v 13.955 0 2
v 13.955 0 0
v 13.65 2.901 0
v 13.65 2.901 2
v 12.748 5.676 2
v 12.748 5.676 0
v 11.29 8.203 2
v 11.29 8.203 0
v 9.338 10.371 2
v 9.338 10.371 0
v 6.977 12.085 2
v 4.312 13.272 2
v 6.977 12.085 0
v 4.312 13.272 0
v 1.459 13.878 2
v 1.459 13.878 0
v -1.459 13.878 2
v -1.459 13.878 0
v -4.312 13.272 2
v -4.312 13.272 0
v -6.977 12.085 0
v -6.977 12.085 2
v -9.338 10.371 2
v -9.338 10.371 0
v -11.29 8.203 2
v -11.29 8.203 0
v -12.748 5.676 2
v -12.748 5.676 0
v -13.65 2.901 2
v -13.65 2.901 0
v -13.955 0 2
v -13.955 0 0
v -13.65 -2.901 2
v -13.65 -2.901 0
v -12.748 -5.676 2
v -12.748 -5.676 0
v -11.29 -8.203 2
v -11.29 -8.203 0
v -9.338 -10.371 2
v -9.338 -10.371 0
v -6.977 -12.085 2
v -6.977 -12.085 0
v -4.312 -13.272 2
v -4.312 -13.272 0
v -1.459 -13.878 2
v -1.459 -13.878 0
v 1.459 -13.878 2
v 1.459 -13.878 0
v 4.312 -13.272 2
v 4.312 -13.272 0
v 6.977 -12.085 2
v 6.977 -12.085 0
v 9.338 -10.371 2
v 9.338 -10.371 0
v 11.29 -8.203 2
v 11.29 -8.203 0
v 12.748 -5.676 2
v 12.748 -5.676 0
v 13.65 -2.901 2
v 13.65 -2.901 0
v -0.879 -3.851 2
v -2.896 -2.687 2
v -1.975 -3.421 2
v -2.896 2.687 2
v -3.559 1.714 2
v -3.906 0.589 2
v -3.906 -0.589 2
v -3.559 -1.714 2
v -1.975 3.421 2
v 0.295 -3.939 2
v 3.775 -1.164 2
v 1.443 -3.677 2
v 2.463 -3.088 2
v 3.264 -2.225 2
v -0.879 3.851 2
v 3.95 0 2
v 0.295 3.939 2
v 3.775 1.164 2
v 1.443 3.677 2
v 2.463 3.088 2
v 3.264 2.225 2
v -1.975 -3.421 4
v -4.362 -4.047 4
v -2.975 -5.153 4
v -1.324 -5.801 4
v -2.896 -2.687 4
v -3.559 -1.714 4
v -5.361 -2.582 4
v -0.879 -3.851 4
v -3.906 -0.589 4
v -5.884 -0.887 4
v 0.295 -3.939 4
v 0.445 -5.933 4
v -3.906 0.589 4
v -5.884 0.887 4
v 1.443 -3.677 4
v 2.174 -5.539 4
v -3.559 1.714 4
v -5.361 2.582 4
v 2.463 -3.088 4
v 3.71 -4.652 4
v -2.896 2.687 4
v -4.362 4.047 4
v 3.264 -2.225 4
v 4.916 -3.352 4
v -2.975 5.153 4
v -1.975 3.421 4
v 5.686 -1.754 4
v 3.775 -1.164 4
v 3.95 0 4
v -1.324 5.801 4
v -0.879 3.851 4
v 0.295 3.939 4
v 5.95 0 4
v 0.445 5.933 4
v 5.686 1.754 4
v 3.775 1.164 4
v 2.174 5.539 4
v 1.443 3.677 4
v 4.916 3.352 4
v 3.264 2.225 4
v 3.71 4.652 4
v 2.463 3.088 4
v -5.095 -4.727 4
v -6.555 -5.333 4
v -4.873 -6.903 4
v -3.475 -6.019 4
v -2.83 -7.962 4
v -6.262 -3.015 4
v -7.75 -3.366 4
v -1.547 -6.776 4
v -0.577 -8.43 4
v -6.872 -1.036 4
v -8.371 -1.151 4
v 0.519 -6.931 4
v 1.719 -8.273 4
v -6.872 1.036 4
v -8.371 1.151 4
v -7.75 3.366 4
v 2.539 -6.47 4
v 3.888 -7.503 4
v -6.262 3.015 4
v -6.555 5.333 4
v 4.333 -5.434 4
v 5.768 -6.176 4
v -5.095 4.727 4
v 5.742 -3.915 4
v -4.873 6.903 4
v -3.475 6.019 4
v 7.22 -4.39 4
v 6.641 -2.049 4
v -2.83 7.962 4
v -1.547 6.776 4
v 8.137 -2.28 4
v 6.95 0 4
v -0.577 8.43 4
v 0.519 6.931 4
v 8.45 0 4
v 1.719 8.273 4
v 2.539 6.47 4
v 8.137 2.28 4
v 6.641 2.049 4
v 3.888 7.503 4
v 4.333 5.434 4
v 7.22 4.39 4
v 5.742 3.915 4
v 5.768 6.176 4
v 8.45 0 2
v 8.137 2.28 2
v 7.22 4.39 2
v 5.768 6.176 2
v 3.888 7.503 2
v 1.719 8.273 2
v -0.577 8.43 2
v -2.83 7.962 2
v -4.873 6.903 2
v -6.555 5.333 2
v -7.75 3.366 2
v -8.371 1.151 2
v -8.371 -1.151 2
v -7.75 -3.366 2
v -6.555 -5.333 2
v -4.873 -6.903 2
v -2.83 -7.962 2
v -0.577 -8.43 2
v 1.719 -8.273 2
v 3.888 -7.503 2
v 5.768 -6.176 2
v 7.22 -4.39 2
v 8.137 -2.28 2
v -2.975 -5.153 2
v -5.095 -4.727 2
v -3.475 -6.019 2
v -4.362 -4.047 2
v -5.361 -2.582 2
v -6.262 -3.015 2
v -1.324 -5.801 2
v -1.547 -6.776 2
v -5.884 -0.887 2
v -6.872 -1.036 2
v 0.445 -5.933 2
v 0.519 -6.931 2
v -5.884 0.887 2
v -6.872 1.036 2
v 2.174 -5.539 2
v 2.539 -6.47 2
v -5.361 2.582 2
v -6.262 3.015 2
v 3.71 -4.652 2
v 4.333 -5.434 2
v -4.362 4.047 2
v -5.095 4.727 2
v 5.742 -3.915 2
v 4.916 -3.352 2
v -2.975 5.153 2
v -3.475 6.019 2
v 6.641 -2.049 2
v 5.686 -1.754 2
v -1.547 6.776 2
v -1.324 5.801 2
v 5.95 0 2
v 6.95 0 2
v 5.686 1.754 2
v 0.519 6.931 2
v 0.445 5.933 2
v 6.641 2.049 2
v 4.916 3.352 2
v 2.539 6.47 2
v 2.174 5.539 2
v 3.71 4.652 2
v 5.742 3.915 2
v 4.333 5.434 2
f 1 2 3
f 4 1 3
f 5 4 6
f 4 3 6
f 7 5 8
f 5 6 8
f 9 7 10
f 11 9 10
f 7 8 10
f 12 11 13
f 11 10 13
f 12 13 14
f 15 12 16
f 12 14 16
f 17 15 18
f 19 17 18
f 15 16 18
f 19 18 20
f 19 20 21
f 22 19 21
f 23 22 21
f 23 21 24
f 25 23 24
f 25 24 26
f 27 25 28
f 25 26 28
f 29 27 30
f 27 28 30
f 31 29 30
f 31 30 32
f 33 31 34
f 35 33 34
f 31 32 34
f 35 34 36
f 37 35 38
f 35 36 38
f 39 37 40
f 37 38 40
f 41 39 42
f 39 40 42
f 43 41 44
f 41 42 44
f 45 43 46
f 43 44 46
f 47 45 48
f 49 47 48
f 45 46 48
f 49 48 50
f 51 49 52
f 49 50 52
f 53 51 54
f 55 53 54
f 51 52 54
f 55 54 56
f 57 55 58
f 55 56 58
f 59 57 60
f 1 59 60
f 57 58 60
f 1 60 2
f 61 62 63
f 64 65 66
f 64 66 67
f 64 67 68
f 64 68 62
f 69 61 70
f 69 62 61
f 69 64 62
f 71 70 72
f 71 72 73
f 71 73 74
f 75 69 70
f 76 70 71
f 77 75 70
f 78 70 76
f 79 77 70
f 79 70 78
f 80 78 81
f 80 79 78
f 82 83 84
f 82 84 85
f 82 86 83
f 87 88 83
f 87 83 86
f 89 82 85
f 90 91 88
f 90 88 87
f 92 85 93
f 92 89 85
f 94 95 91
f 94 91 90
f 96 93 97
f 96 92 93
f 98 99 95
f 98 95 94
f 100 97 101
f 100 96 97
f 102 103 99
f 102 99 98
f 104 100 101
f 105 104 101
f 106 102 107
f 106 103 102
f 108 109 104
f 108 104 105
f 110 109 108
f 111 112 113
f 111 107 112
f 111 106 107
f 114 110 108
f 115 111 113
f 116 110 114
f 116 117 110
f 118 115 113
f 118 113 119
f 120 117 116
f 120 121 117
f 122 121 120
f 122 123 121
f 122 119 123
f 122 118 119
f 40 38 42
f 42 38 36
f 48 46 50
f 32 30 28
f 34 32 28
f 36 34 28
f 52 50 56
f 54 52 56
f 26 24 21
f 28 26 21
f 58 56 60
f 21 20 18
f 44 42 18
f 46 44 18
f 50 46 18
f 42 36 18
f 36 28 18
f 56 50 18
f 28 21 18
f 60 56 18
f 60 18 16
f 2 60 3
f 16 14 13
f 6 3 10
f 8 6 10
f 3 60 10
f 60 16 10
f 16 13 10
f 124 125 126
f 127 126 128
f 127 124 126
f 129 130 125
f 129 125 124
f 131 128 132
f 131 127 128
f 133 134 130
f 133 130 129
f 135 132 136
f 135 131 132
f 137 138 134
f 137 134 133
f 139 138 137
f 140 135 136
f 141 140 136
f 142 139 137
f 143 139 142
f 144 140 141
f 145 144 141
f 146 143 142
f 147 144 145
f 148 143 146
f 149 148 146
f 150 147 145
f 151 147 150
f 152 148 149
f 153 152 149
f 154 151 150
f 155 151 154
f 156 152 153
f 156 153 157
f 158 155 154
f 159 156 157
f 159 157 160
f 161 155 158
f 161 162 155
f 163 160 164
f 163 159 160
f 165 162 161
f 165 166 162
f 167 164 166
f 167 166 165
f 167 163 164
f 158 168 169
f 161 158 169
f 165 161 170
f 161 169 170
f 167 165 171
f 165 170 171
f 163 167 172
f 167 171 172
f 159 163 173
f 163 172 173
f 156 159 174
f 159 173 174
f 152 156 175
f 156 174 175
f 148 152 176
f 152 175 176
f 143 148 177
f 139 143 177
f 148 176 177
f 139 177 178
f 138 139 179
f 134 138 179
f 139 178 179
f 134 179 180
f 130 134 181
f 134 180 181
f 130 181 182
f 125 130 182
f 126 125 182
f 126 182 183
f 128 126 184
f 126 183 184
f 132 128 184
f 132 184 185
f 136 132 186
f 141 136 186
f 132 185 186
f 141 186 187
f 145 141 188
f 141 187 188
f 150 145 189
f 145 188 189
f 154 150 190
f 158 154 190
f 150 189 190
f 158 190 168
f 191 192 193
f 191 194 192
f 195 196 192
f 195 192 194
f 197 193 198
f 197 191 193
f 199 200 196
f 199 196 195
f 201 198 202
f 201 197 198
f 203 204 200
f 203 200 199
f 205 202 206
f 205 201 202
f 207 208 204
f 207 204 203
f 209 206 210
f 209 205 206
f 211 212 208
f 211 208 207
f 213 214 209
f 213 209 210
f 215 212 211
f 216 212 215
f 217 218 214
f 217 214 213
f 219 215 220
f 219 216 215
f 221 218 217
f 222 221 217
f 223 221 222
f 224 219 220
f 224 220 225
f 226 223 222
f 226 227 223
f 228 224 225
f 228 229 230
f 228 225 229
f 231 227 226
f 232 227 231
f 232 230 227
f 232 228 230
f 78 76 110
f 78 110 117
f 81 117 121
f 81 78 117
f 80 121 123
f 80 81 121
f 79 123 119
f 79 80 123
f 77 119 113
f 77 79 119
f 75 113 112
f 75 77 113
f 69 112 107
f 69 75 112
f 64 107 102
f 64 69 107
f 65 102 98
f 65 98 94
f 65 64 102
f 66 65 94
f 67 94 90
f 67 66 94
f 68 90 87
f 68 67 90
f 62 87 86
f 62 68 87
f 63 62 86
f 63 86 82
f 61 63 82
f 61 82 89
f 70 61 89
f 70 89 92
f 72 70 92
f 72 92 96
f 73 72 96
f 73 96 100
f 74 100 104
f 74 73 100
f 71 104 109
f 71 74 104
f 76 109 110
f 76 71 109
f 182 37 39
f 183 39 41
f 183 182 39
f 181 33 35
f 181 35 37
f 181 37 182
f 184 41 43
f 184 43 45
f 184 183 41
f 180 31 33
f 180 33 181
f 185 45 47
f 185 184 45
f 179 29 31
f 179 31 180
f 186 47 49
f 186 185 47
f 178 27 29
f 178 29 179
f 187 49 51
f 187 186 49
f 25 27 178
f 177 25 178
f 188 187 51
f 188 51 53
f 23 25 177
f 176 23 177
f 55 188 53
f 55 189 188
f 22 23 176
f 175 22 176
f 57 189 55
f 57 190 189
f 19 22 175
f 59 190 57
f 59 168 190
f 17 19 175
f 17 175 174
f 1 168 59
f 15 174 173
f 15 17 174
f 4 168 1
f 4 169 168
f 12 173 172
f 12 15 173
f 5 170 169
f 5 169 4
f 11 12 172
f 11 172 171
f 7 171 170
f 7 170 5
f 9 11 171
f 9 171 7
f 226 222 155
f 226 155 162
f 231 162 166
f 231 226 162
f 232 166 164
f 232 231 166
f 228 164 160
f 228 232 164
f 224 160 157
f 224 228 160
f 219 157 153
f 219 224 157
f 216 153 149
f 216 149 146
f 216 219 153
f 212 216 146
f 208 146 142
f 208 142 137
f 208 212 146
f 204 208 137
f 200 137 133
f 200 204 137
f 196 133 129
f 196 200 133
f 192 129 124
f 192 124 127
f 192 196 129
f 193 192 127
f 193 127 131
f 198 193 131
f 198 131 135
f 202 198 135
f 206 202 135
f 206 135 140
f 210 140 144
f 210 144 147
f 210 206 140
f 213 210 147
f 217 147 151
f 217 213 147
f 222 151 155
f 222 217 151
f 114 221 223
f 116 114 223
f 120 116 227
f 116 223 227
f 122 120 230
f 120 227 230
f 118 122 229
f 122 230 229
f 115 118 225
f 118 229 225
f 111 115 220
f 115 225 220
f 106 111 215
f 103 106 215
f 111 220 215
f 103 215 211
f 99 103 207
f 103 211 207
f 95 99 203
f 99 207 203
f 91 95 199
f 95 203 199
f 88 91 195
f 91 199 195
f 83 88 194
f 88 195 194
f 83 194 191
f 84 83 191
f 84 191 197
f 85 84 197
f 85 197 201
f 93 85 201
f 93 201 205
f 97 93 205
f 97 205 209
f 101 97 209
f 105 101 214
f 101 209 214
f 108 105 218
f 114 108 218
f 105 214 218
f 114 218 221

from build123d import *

# Parameters (mm, degrees)
F0_R     = 13.954927
F1_DEPTH = 2
F2_R     = 5.95
F2_R_2   = 3.95
F3_DEPTH = 2
F2_R_3   = 8.45
F2_R_4   = 6.95
F4_DEPTH = 2


with BuildPart() as f1:
    # F0 (on Top) → F1 (new body)
    with BuildSketch(Plane.XY):
        Circle(F0_R)
    extrude(amount=F1_DEPTH)

    # F2 (on face) → F3 (join)
    with BuildSketch(Plane.XY.offset(2)):
        Circle(F2_R)
        Circle(F2_R_2, mode=Mode.SUBTRACT)
    extrude(amount=F3_DEPTH)

    # F2 (on face) → F4 (join)
    with BuildSketch(Plane.XY.offset(2)):
        Circle(F2_R_3)
        Circle(F2_R_4, mode=Mode.SUBTRACT)
    extrude(amount=F4_DEPTH)


solid = f1.part
